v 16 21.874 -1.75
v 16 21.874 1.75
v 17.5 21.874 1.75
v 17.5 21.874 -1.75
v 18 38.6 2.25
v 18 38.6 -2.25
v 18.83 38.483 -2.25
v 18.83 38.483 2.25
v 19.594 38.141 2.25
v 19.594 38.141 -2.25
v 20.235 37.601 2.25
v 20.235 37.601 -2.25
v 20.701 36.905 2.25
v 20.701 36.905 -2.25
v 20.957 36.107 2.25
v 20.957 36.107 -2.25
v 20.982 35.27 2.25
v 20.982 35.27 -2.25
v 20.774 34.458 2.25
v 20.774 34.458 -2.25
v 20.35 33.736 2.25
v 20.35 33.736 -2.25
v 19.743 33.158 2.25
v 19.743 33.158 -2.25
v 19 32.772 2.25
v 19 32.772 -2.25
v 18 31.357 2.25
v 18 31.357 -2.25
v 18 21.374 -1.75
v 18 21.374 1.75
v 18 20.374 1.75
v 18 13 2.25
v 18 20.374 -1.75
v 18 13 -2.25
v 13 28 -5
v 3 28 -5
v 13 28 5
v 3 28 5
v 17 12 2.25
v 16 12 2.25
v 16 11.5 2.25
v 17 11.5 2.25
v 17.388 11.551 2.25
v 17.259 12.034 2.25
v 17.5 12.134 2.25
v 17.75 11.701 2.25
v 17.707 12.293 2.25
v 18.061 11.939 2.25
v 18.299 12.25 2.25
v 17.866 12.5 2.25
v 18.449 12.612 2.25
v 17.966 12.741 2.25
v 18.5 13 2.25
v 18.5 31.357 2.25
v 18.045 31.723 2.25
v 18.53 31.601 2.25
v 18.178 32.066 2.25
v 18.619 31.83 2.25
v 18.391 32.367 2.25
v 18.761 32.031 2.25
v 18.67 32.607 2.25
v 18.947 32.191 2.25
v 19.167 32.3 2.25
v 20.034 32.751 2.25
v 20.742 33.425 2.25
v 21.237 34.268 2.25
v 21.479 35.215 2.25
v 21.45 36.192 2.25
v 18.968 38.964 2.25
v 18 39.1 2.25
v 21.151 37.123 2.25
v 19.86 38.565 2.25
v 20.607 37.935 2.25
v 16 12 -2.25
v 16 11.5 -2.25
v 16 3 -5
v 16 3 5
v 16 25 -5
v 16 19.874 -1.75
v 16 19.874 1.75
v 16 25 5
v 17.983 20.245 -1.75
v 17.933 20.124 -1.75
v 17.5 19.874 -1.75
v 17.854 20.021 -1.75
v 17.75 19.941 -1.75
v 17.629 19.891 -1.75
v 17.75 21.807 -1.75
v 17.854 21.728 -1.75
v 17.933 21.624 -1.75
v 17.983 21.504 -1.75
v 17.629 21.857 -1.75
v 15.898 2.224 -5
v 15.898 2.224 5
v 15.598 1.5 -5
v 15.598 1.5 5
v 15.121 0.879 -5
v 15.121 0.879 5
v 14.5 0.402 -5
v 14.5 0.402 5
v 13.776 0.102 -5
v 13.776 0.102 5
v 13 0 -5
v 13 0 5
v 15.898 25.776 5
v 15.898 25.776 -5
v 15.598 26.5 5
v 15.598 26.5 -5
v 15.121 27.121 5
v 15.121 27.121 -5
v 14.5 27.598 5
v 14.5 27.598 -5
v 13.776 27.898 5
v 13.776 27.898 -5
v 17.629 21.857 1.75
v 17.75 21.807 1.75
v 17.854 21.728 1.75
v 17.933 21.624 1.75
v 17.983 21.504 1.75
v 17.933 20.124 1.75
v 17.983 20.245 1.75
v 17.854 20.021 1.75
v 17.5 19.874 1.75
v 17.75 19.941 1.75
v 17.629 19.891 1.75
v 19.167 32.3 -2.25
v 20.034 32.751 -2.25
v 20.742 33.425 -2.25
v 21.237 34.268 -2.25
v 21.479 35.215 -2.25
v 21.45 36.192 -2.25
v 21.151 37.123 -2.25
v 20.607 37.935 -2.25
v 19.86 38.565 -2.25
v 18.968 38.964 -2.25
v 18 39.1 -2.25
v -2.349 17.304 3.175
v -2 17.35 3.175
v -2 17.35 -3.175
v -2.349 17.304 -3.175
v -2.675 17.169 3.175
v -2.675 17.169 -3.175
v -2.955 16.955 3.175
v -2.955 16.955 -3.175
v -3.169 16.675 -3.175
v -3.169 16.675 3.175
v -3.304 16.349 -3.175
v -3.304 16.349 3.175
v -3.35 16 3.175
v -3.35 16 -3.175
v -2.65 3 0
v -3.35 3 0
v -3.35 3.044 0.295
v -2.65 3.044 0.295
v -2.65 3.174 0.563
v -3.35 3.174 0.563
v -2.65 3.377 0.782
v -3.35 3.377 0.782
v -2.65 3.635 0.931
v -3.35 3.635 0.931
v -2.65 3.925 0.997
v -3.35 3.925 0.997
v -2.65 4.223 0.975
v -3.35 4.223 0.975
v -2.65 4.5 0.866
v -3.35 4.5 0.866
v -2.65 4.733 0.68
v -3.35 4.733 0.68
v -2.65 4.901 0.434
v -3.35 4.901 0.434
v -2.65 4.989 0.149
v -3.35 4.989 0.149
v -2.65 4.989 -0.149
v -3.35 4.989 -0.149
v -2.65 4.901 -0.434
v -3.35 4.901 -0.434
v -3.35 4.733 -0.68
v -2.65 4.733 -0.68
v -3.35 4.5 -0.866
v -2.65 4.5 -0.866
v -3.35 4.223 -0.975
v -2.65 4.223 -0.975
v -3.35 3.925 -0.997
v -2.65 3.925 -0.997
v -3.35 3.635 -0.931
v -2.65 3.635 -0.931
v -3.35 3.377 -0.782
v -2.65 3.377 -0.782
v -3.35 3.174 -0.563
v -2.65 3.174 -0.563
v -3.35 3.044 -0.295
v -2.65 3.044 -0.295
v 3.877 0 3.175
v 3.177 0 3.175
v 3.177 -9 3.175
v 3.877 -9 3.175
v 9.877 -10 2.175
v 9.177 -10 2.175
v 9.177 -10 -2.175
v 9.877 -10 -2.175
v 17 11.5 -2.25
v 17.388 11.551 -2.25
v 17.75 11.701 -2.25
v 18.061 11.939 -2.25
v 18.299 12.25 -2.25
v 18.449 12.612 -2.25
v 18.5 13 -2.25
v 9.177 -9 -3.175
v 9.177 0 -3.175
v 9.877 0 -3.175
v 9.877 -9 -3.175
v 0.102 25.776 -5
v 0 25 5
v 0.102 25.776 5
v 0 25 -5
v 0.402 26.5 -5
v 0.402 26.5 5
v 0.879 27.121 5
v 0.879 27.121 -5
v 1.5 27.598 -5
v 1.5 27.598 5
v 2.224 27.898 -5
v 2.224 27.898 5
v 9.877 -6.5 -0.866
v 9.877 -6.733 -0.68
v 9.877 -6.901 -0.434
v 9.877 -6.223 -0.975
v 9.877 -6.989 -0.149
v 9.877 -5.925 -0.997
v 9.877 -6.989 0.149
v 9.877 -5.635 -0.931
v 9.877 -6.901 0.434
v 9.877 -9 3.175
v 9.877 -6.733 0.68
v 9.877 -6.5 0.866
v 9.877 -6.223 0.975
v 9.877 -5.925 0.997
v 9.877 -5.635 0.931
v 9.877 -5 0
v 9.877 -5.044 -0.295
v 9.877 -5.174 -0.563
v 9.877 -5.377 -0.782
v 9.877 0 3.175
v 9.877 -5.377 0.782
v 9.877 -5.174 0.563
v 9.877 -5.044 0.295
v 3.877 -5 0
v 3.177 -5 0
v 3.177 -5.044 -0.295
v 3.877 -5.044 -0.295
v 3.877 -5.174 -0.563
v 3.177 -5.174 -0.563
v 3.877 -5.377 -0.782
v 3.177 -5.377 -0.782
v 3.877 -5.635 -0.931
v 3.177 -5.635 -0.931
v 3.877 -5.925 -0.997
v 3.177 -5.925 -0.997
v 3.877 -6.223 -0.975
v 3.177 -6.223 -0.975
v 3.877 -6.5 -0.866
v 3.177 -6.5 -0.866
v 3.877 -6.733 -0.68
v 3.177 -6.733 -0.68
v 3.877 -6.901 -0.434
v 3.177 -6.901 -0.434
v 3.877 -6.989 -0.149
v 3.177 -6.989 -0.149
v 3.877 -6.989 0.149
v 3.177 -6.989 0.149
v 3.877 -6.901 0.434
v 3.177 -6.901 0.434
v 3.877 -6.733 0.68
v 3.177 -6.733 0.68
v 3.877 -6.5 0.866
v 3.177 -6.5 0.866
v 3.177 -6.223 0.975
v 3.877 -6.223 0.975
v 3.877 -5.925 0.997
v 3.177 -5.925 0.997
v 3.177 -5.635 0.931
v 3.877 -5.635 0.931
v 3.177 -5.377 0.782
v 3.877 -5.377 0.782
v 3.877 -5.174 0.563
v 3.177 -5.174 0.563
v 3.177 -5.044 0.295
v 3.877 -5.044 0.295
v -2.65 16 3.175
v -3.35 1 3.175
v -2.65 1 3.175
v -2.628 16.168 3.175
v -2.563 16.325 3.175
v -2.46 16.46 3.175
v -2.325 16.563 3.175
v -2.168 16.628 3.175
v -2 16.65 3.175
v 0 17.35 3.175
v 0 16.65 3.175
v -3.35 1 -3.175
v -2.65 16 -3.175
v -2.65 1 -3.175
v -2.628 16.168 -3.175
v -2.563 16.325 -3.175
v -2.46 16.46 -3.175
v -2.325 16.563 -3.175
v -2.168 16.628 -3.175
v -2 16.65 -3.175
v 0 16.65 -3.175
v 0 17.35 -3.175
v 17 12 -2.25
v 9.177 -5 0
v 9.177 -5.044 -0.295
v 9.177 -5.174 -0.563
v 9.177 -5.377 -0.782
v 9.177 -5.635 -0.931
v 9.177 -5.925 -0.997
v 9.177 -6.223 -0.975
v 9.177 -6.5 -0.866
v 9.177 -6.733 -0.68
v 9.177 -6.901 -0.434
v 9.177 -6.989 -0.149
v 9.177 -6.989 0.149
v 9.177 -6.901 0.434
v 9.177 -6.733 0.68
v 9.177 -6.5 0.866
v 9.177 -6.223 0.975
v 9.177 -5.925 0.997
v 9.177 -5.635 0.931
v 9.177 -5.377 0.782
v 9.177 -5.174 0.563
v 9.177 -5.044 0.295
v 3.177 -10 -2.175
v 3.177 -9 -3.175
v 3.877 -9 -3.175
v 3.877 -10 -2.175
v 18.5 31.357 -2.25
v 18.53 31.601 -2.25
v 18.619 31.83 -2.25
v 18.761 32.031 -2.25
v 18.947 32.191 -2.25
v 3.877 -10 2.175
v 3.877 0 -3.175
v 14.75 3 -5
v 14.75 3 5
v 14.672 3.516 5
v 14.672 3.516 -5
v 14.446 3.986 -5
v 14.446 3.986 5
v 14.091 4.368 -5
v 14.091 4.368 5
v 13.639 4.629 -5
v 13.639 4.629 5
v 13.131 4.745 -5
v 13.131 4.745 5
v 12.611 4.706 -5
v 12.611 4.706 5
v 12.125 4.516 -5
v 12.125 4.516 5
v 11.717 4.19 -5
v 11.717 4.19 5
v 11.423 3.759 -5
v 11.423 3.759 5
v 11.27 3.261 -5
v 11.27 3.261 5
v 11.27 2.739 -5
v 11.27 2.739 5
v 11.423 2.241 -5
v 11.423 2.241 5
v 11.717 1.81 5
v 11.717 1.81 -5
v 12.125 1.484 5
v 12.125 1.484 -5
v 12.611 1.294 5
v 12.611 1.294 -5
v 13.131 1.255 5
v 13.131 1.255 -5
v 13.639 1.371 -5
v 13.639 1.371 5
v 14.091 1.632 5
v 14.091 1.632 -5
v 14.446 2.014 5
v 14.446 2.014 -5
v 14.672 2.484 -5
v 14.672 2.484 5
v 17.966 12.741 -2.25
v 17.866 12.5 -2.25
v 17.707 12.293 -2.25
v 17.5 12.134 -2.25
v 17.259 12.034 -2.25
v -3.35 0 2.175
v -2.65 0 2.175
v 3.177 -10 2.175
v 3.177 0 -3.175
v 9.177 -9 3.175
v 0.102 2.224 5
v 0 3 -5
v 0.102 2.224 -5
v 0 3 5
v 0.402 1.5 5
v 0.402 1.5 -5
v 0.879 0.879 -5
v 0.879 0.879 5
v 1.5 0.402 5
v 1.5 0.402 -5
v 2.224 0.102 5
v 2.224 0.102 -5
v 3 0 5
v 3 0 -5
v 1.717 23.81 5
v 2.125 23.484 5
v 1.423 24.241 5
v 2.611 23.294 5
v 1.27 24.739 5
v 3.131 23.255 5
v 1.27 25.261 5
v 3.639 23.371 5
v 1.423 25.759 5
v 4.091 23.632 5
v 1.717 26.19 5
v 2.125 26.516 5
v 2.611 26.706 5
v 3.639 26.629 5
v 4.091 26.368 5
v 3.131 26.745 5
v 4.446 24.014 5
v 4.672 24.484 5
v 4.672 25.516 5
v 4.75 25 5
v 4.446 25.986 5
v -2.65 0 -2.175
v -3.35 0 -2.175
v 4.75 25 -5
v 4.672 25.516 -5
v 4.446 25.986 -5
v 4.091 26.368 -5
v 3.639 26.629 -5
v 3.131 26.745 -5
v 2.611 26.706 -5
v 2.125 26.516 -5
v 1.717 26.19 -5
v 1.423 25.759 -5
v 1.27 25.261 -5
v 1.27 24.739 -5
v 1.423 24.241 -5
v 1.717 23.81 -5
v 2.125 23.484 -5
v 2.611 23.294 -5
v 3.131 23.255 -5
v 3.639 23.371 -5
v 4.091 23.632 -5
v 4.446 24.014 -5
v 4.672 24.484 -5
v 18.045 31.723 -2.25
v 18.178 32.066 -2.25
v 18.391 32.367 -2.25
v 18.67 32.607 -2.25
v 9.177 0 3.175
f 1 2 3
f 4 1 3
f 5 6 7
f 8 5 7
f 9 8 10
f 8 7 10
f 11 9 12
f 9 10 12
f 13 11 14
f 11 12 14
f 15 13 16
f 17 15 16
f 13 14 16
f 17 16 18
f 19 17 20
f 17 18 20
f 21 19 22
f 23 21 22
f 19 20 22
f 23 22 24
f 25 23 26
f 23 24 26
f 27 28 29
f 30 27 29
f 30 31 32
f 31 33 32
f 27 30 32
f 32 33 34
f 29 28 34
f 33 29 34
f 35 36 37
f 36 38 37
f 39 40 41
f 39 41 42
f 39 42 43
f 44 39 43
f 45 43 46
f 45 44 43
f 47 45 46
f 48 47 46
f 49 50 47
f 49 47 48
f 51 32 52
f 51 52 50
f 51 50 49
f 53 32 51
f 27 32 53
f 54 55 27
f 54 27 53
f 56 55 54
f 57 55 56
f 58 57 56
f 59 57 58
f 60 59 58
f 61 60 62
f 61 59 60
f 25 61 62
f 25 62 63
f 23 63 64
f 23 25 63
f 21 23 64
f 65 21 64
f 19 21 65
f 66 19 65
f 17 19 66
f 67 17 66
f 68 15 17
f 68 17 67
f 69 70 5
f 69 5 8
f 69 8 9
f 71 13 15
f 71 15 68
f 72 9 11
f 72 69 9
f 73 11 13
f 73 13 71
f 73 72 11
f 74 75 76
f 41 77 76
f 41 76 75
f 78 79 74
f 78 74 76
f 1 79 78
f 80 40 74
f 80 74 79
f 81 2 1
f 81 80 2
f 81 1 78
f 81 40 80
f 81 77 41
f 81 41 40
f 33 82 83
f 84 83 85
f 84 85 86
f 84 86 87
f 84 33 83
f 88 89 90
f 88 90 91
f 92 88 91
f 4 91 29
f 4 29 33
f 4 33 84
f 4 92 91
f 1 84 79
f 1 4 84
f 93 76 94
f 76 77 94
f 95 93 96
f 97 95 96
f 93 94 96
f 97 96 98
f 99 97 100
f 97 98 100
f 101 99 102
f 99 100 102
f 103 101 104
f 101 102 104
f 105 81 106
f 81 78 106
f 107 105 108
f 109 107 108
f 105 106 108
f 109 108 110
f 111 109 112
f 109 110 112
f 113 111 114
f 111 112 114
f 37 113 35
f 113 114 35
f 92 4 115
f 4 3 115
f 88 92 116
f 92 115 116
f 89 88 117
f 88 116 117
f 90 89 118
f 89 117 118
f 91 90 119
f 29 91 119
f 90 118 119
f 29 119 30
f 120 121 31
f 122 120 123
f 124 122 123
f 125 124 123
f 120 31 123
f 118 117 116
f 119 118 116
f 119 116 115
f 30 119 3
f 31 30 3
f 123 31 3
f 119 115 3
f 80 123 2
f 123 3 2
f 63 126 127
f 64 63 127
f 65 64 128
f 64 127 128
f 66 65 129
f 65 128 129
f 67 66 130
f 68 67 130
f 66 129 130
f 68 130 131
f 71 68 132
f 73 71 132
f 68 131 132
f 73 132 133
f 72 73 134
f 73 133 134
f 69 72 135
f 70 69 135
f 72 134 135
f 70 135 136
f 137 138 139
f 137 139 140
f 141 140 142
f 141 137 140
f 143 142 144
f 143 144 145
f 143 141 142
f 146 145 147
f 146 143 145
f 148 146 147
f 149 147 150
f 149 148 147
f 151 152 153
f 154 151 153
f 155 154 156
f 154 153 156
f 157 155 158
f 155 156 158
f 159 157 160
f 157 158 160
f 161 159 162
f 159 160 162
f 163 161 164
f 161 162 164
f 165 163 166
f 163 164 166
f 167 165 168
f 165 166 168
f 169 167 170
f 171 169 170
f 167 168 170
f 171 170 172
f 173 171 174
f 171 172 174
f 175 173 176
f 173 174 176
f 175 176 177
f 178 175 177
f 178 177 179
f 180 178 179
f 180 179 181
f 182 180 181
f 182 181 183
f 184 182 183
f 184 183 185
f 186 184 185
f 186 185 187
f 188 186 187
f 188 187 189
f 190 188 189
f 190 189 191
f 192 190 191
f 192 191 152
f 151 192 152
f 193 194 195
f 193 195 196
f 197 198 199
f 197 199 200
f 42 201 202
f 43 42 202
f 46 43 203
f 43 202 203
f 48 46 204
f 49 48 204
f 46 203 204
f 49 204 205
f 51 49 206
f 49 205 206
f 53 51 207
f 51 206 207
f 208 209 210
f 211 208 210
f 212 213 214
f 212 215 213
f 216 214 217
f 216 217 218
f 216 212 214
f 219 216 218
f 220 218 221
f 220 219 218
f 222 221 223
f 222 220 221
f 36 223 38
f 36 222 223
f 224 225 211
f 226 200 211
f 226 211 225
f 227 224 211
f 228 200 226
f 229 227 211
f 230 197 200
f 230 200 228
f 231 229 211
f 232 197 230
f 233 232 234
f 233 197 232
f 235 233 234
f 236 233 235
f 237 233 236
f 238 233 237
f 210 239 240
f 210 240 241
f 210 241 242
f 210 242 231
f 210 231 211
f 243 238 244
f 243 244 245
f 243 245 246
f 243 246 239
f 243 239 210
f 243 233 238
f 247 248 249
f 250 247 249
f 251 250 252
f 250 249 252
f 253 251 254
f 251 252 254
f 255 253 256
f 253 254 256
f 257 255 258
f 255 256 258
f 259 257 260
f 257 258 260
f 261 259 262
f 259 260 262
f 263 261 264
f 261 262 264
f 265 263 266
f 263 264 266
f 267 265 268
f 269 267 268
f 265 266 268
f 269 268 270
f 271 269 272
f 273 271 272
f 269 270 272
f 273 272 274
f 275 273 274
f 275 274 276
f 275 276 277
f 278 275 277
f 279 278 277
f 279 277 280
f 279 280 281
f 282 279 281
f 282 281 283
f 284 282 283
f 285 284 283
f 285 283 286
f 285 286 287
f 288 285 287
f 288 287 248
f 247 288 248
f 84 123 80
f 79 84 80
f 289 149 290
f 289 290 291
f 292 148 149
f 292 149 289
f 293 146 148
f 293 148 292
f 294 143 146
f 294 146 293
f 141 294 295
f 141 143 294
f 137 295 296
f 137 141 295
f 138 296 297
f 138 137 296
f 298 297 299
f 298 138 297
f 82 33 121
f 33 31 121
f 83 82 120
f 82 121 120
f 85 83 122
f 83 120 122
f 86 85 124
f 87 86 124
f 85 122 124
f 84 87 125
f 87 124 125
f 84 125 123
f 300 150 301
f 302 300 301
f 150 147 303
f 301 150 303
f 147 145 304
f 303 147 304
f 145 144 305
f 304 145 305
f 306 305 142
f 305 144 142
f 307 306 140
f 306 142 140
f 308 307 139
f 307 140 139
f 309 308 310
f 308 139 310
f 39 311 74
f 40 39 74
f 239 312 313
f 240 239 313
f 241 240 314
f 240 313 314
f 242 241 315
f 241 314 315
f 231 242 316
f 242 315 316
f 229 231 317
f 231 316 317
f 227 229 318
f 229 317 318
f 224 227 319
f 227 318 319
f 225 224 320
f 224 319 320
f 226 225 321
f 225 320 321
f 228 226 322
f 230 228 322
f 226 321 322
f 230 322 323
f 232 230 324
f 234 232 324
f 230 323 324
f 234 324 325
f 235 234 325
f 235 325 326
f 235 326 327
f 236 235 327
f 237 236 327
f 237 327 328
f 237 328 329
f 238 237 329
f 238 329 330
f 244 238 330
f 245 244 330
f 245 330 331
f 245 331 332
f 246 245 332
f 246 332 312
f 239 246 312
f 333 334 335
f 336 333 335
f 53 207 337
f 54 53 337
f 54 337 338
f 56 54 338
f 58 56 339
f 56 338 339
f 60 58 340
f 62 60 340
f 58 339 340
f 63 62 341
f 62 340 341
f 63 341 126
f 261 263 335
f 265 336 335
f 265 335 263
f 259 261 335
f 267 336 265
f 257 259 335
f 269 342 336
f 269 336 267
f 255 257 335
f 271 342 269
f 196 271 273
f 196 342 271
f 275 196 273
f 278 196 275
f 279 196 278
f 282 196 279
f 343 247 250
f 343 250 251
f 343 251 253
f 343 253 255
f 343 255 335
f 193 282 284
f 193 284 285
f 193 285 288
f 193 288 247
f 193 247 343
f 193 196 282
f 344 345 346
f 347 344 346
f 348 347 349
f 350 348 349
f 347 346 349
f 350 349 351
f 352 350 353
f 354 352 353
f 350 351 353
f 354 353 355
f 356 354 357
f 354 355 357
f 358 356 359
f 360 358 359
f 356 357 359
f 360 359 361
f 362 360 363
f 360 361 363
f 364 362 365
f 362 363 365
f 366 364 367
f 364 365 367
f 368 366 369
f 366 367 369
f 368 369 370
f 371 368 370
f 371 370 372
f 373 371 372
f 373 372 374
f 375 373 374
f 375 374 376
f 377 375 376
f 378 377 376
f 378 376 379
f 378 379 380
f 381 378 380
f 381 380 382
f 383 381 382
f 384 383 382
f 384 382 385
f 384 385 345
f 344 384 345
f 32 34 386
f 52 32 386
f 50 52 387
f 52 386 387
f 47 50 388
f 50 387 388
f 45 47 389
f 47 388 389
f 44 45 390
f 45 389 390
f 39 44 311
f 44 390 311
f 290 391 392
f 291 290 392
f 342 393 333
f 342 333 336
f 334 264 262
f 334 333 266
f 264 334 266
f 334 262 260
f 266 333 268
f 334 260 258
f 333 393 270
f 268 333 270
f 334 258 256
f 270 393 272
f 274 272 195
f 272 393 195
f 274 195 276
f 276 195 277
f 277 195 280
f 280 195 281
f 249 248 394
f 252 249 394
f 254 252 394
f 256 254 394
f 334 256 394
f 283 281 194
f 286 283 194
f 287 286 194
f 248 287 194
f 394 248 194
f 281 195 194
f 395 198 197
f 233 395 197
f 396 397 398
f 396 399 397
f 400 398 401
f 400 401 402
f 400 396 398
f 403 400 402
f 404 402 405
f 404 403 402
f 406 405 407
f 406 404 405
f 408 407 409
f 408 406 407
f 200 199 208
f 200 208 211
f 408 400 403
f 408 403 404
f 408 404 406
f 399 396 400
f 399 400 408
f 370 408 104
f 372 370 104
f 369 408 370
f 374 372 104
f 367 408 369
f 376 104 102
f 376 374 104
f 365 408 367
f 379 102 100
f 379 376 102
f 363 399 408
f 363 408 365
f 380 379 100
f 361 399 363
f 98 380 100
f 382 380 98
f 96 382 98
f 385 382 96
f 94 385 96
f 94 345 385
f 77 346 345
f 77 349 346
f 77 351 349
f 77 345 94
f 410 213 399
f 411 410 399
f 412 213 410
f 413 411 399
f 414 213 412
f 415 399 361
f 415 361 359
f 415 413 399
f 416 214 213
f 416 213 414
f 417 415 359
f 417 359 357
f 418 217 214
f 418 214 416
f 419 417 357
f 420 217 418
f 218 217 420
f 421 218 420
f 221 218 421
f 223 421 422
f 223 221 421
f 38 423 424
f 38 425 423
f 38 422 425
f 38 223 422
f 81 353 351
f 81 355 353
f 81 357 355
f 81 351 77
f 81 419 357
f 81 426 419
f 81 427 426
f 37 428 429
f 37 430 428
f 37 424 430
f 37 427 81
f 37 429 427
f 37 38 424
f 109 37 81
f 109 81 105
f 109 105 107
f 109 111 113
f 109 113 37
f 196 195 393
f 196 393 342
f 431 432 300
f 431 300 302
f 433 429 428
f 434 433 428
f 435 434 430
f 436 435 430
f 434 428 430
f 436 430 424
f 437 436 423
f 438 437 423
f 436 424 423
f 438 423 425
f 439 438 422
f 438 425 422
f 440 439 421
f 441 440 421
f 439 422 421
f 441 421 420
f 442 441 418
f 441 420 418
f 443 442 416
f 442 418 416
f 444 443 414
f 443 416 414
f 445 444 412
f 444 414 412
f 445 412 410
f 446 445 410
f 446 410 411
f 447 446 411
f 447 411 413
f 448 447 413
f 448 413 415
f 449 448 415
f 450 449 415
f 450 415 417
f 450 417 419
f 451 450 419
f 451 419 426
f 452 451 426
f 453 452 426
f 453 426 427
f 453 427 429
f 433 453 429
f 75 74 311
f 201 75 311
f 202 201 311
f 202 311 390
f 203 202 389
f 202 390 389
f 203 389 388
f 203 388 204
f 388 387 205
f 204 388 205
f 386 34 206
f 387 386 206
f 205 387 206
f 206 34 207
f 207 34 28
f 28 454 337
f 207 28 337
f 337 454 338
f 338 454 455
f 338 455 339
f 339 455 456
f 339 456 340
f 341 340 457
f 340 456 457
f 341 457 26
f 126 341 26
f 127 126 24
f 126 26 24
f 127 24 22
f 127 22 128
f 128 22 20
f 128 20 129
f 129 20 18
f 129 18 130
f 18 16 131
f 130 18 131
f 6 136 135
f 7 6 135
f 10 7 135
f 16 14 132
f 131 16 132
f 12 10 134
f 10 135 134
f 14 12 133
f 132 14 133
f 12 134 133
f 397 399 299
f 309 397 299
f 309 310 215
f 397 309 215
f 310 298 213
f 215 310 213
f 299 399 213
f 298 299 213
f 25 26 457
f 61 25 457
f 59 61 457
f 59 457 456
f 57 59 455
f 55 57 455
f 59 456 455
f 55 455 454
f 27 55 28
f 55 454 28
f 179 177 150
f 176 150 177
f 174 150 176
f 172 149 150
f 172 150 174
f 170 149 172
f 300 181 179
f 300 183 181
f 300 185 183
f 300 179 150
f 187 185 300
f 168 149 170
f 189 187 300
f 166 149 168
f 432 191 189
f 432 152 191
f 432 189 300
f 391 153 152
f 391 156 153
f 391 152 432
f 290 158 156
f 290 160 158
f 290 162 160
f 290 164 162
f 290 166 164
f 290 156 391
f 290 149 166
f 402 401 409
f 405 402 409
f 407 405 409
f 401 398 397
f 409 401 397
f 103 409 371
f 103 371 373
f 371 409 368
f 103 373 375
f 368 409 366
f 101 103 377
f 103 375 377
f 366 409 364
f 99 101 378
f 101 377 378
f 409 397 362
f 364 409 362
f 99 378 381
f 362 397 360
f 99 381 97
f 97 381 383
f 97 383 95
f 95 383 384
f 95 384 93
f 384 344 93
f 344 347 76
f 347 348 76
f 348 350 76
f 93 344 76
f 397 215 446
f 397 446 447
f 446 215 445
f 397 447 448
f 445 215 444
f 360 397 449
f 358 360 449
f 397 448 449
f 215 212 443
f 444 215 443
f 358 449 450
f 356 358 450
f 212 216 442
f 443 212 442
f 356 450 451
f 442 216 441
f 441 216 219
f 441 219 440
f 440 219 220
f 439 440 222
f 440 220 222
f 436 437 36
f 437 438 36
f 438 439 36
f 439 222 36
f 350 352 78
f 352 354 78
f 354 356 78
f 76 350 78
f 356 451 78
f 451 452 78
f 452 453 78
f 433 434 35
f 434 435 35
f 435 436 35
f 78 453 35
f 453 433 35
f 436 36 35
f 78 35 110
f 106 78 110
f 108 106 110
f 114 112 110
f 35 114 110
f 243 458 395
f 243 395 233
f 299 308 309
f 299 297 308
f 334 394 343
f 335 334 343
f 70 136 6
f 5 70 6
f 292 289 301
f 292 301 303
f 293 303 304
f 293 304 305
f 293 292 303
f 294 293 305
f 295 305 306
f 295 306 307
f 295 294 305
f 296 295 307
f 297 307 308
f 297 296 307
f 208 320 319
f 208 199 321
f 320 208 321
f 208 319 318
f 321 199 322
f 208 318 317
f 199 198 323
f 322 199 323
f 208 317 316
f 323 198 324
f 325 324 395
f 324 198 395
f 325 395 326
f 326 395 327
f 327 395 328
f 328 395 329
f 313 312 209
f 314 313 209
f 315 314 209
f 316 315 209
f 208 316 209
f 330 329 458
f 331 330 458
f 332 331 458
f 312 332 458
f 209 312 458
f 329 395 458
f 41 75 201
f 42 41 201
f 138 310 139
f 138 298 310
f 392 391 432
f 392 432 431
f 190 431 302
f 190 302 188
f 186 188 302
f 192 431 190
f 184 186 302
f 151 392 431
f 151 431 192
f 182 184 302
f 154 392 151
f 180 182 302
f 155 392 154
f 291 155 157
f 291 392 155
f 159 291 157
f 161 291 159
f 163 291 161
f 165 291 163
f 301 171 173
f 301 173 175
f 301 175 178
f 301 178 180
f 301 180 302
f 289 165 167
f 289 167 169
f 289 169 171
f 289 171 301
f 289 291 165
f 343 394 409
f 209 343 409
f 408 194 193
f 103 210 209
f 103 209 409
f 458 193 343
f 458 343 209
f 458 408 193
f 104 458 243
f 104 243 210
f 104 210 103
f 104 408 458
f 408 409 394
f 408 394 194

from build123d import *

# Parameters (mm, degrees)
ESBO_O1_W             = 16
ESBO_O1_H             = 28
EXTRUS_O1_DEPTH       = 5
FILETE1_R             = 3
ESBO_O2_R             = 1.75
CORTE_EXTRUS_O1_DEPTH = 34.763886032
FLANGE_BASE1_START    = -2.25
FLANGE_BASE1_DEPTH    = 4.5
EXTRUS_O2_DEPTH       = 1.75
EXTRUS_O_FINA1_DEPTH  = 3.175
ESBO_O6_4_W           = 0.7
ESBO_O6_4_H           = 10
EXTRUS_O_FINA2_DEPTH  = 3.175
ESBO_O6_5_W           = 0.7
ESBO_O6_5_H           = 10
EXTRUS_O_FINA3_DEPTH  = 3.175
CHANFRO1_SIZE         = 1
ESBO_O7_R             = 1
CORTE_EXTRUS_O8_DEPTH = 3.35
ESBO_O7_6_R           = 1
CORTE_EXTRUS_O9_DEPTH = 47.597558949


# Read off the part's stored shape, not the designer's step: Flange-base1
with BuildPart() as part:
    # Esboço1 → Extrusão1 (new, symmetric)
    with BuildSketch(Plane.XY):
        with Locations((8, 14)):
            Rectangle(ESBO_O1_W, ESBO_O1_H)
    extrude(amount=EXTRUS_O1_DEPTH, both=True)

    # Filete1
    filete1_edges = [part.edges().sort_by_distance(p)[0] for p in [
        (0, 28, 0),
        (16, 28, 0),
        (16, 0, 0),
        (0, 0, 0),
    ]]
    fillet(filete1_edges, radius=FILETE1_R)

    # Esboço2 → Corte-extrusão1 (cut, through all)
    with BuildSketch(Plane.XY.offset(5)):
        with Locations((3, 25)):
            Circle(ESBO_O2_R)
        with Locations((13, 3)):
            Circle(ESBO_O2_R)
    extrude(amount=-CORTE_EXTRUS_O1_DEPTH, mode=Mode.SUBTRACT)



with BuildPart() as body_2:
    # Flange-base1 outline → Flange-base1 (new body)
    with BuildSketch(Plane.XY.offset(FLANGE_BASE1_START)):
        with BuildLine():
            ThreePointArc((19.166666667, 32.300168354), (21.449594959, 36.191856925), (18, 39.1))
            Line((18, 39.1), (18, 38.6))
            ThreePointArc((18, 38.6), (20.956795679, 36.107305936), (19, 32.771572875))
            ThreePointArc((19, 32.771572875), (18.275255129, 32.223384717), (18, 31.357359313))
            Line((18, 31.357359313), (18, 13))
            ThreePointArc((18, 13), (17.707106781, 12.292893219), (17, 12))
            Line((17, 12), (16, 12))
            Line((16, 12), (16, 11.5))
            Line((16, 11.5), (17, 11.5))
            ThreePointArc((17, 11.5), (18.060660172, 11.939339828), (18.5, 13))
            Line((18.5, 13), (18.5, 31.357359313))
            ThreePointArc((18.5, 31.357359313), (18.683503419, 31.934709582), (19.166666667, 32.300168354))
        make_face()
    extrude(amount=FLANGE_BASE1_DEPTH)


with BuildPart() as part_1:
    add(part.part)

    add(body_2.part)  # Extrusão2 merges body 2
    # Esboço5 → Extrusão2 (add, symmetric)
    with BuildSketch(Plane.XY):
        with BuildLine():
            Line((16, 21.874244368), (17.5, 21.874244368))
            ThreePointArc((17.5, 21.874244368), (17.853553391, 21.727797759), (18, 21.374244368))
            Line((18, 21.374244368), (18, 20.374244368))
            ThreePointArc((18, 20.374244368), (17.853553391, 20.020690978), (17.5, 19.874244368))
            Line((17.5, 19.874244368), (16, 19.874244368))
            Line((16, 19.874244368), (16, 21.874244368))
        make_face()
    extrude(amount=EXTRUS_O2_DEPTH, both=True)

    # Esboço6 → Extrusão-Fina1 (add, symmetric)
    with BuildSketch(Plane.XY):
        with BuildLine():
            Line((0, 17.35), (-2, 17.35))
            ThreePointArc((-2, 17.35), (-2.954594155, 16.954594155), (-3.35, 16))
            Line((-3.35, 16), (-3.35, 0))
            Line((-3.35, 0), (-2.65, 0))
            Line((-2.65, 0), (-2.65, 16))
            ThreePointArc((-2.65, 16), (-2.459619408, 16.459619408), (-2, 16.65))
            Line((-2, 16.65), (0, 16.65))
            Line((0, 16.65), (0, 17.35))
        make_face()
    extrude(amount=EXTRUS_O_FINA1_DEPTH, both=True)

    # Esboço6<4> → Extrusão-Fina2 (add, symmetric)
    with BuildSketch(Plane.XY):
        with Locations((3.526922814, -5)):
            Rectangle(ESBO_O6_4_W, ESBO_O6_4_H)
    extrude(amount=EXTRUS_O_FINA2_DEPTH, both=True)

    # Esboço6<5> → Extrusão-Fina3 (add, symmetric)
    with BuildSketch(Plane.XY):
        with Locations((3.526922814, -5)):
            Rectangle(ESBO_O6_5_W, ESBO_O6_5_H)
        with BuildLine():
            Line((0, 17.35), (-2, 17.35))
            ThreePointArc((-2, 17.35), (-2.954594155, 16.954594155), (-3.35, 16))
            Line((-3.35, 16), (-3.35, 0))
            Line((-3.35, 0), (-2.65, 0))
            Line((-2.65, 0), (-2.65, 16))
            ThreePointArc((-2.65, 16), (-2.459619408, 16.459619408), (-2, 16.65))
            Line((-2, 16.65), (0, 16.65))
            Line((0, 16.65), (0, 17.35))
        make_face()
        with Locations((9.526922814, -5)):
            Rectangle(ESBO_O6_5_W, ESBO_O6_5_H)
    extrude(amount=EXTRUS_O_FINA3_DEPTH, both=True)

    # Chanfro1
    chanfro1_edges = [part_1.edges().sort_by_distance(p)[0] for p in [
        (-3, 0, -3.175),
        (3.526922814, -10, 3.175),
        (3.526922814, -10, -3.175),
        (9.526922814, -10, 3.175),
        (9.526922814, -10, -3.175),
        (-3, 0, 3.175),
    ]]
    chamfer(chanfro1_edges, length=CHANFRO1_SIZE)

    # Esboço7 → Corte-extrusão8 (cut)
    with BuildSketch(Plane.ZY.offset(3.35)):
        with Locations(Location((0, 4, 0), (0, 0, 270))):
            Circle(ESBO_O7_R)
    extrude(amount=-CORTE_EXTRUS_O8_DEPTH, mode=Mode.SUBTRACT)

    # Esboço7<6> → Corte-extrusão9 (cut, through all)
    with BuildSketch(Plane.ZY.offset(3.35)):
        with Locations(Location((0, -6, 0), (0, 0, 90))):
            Circle(ESBO_O7_6_R)
    extrude(amount=-CORTE_EXTRUS_O9_DEPTH, mode=Mode.SUBTRACT)


solid = part_1.part
